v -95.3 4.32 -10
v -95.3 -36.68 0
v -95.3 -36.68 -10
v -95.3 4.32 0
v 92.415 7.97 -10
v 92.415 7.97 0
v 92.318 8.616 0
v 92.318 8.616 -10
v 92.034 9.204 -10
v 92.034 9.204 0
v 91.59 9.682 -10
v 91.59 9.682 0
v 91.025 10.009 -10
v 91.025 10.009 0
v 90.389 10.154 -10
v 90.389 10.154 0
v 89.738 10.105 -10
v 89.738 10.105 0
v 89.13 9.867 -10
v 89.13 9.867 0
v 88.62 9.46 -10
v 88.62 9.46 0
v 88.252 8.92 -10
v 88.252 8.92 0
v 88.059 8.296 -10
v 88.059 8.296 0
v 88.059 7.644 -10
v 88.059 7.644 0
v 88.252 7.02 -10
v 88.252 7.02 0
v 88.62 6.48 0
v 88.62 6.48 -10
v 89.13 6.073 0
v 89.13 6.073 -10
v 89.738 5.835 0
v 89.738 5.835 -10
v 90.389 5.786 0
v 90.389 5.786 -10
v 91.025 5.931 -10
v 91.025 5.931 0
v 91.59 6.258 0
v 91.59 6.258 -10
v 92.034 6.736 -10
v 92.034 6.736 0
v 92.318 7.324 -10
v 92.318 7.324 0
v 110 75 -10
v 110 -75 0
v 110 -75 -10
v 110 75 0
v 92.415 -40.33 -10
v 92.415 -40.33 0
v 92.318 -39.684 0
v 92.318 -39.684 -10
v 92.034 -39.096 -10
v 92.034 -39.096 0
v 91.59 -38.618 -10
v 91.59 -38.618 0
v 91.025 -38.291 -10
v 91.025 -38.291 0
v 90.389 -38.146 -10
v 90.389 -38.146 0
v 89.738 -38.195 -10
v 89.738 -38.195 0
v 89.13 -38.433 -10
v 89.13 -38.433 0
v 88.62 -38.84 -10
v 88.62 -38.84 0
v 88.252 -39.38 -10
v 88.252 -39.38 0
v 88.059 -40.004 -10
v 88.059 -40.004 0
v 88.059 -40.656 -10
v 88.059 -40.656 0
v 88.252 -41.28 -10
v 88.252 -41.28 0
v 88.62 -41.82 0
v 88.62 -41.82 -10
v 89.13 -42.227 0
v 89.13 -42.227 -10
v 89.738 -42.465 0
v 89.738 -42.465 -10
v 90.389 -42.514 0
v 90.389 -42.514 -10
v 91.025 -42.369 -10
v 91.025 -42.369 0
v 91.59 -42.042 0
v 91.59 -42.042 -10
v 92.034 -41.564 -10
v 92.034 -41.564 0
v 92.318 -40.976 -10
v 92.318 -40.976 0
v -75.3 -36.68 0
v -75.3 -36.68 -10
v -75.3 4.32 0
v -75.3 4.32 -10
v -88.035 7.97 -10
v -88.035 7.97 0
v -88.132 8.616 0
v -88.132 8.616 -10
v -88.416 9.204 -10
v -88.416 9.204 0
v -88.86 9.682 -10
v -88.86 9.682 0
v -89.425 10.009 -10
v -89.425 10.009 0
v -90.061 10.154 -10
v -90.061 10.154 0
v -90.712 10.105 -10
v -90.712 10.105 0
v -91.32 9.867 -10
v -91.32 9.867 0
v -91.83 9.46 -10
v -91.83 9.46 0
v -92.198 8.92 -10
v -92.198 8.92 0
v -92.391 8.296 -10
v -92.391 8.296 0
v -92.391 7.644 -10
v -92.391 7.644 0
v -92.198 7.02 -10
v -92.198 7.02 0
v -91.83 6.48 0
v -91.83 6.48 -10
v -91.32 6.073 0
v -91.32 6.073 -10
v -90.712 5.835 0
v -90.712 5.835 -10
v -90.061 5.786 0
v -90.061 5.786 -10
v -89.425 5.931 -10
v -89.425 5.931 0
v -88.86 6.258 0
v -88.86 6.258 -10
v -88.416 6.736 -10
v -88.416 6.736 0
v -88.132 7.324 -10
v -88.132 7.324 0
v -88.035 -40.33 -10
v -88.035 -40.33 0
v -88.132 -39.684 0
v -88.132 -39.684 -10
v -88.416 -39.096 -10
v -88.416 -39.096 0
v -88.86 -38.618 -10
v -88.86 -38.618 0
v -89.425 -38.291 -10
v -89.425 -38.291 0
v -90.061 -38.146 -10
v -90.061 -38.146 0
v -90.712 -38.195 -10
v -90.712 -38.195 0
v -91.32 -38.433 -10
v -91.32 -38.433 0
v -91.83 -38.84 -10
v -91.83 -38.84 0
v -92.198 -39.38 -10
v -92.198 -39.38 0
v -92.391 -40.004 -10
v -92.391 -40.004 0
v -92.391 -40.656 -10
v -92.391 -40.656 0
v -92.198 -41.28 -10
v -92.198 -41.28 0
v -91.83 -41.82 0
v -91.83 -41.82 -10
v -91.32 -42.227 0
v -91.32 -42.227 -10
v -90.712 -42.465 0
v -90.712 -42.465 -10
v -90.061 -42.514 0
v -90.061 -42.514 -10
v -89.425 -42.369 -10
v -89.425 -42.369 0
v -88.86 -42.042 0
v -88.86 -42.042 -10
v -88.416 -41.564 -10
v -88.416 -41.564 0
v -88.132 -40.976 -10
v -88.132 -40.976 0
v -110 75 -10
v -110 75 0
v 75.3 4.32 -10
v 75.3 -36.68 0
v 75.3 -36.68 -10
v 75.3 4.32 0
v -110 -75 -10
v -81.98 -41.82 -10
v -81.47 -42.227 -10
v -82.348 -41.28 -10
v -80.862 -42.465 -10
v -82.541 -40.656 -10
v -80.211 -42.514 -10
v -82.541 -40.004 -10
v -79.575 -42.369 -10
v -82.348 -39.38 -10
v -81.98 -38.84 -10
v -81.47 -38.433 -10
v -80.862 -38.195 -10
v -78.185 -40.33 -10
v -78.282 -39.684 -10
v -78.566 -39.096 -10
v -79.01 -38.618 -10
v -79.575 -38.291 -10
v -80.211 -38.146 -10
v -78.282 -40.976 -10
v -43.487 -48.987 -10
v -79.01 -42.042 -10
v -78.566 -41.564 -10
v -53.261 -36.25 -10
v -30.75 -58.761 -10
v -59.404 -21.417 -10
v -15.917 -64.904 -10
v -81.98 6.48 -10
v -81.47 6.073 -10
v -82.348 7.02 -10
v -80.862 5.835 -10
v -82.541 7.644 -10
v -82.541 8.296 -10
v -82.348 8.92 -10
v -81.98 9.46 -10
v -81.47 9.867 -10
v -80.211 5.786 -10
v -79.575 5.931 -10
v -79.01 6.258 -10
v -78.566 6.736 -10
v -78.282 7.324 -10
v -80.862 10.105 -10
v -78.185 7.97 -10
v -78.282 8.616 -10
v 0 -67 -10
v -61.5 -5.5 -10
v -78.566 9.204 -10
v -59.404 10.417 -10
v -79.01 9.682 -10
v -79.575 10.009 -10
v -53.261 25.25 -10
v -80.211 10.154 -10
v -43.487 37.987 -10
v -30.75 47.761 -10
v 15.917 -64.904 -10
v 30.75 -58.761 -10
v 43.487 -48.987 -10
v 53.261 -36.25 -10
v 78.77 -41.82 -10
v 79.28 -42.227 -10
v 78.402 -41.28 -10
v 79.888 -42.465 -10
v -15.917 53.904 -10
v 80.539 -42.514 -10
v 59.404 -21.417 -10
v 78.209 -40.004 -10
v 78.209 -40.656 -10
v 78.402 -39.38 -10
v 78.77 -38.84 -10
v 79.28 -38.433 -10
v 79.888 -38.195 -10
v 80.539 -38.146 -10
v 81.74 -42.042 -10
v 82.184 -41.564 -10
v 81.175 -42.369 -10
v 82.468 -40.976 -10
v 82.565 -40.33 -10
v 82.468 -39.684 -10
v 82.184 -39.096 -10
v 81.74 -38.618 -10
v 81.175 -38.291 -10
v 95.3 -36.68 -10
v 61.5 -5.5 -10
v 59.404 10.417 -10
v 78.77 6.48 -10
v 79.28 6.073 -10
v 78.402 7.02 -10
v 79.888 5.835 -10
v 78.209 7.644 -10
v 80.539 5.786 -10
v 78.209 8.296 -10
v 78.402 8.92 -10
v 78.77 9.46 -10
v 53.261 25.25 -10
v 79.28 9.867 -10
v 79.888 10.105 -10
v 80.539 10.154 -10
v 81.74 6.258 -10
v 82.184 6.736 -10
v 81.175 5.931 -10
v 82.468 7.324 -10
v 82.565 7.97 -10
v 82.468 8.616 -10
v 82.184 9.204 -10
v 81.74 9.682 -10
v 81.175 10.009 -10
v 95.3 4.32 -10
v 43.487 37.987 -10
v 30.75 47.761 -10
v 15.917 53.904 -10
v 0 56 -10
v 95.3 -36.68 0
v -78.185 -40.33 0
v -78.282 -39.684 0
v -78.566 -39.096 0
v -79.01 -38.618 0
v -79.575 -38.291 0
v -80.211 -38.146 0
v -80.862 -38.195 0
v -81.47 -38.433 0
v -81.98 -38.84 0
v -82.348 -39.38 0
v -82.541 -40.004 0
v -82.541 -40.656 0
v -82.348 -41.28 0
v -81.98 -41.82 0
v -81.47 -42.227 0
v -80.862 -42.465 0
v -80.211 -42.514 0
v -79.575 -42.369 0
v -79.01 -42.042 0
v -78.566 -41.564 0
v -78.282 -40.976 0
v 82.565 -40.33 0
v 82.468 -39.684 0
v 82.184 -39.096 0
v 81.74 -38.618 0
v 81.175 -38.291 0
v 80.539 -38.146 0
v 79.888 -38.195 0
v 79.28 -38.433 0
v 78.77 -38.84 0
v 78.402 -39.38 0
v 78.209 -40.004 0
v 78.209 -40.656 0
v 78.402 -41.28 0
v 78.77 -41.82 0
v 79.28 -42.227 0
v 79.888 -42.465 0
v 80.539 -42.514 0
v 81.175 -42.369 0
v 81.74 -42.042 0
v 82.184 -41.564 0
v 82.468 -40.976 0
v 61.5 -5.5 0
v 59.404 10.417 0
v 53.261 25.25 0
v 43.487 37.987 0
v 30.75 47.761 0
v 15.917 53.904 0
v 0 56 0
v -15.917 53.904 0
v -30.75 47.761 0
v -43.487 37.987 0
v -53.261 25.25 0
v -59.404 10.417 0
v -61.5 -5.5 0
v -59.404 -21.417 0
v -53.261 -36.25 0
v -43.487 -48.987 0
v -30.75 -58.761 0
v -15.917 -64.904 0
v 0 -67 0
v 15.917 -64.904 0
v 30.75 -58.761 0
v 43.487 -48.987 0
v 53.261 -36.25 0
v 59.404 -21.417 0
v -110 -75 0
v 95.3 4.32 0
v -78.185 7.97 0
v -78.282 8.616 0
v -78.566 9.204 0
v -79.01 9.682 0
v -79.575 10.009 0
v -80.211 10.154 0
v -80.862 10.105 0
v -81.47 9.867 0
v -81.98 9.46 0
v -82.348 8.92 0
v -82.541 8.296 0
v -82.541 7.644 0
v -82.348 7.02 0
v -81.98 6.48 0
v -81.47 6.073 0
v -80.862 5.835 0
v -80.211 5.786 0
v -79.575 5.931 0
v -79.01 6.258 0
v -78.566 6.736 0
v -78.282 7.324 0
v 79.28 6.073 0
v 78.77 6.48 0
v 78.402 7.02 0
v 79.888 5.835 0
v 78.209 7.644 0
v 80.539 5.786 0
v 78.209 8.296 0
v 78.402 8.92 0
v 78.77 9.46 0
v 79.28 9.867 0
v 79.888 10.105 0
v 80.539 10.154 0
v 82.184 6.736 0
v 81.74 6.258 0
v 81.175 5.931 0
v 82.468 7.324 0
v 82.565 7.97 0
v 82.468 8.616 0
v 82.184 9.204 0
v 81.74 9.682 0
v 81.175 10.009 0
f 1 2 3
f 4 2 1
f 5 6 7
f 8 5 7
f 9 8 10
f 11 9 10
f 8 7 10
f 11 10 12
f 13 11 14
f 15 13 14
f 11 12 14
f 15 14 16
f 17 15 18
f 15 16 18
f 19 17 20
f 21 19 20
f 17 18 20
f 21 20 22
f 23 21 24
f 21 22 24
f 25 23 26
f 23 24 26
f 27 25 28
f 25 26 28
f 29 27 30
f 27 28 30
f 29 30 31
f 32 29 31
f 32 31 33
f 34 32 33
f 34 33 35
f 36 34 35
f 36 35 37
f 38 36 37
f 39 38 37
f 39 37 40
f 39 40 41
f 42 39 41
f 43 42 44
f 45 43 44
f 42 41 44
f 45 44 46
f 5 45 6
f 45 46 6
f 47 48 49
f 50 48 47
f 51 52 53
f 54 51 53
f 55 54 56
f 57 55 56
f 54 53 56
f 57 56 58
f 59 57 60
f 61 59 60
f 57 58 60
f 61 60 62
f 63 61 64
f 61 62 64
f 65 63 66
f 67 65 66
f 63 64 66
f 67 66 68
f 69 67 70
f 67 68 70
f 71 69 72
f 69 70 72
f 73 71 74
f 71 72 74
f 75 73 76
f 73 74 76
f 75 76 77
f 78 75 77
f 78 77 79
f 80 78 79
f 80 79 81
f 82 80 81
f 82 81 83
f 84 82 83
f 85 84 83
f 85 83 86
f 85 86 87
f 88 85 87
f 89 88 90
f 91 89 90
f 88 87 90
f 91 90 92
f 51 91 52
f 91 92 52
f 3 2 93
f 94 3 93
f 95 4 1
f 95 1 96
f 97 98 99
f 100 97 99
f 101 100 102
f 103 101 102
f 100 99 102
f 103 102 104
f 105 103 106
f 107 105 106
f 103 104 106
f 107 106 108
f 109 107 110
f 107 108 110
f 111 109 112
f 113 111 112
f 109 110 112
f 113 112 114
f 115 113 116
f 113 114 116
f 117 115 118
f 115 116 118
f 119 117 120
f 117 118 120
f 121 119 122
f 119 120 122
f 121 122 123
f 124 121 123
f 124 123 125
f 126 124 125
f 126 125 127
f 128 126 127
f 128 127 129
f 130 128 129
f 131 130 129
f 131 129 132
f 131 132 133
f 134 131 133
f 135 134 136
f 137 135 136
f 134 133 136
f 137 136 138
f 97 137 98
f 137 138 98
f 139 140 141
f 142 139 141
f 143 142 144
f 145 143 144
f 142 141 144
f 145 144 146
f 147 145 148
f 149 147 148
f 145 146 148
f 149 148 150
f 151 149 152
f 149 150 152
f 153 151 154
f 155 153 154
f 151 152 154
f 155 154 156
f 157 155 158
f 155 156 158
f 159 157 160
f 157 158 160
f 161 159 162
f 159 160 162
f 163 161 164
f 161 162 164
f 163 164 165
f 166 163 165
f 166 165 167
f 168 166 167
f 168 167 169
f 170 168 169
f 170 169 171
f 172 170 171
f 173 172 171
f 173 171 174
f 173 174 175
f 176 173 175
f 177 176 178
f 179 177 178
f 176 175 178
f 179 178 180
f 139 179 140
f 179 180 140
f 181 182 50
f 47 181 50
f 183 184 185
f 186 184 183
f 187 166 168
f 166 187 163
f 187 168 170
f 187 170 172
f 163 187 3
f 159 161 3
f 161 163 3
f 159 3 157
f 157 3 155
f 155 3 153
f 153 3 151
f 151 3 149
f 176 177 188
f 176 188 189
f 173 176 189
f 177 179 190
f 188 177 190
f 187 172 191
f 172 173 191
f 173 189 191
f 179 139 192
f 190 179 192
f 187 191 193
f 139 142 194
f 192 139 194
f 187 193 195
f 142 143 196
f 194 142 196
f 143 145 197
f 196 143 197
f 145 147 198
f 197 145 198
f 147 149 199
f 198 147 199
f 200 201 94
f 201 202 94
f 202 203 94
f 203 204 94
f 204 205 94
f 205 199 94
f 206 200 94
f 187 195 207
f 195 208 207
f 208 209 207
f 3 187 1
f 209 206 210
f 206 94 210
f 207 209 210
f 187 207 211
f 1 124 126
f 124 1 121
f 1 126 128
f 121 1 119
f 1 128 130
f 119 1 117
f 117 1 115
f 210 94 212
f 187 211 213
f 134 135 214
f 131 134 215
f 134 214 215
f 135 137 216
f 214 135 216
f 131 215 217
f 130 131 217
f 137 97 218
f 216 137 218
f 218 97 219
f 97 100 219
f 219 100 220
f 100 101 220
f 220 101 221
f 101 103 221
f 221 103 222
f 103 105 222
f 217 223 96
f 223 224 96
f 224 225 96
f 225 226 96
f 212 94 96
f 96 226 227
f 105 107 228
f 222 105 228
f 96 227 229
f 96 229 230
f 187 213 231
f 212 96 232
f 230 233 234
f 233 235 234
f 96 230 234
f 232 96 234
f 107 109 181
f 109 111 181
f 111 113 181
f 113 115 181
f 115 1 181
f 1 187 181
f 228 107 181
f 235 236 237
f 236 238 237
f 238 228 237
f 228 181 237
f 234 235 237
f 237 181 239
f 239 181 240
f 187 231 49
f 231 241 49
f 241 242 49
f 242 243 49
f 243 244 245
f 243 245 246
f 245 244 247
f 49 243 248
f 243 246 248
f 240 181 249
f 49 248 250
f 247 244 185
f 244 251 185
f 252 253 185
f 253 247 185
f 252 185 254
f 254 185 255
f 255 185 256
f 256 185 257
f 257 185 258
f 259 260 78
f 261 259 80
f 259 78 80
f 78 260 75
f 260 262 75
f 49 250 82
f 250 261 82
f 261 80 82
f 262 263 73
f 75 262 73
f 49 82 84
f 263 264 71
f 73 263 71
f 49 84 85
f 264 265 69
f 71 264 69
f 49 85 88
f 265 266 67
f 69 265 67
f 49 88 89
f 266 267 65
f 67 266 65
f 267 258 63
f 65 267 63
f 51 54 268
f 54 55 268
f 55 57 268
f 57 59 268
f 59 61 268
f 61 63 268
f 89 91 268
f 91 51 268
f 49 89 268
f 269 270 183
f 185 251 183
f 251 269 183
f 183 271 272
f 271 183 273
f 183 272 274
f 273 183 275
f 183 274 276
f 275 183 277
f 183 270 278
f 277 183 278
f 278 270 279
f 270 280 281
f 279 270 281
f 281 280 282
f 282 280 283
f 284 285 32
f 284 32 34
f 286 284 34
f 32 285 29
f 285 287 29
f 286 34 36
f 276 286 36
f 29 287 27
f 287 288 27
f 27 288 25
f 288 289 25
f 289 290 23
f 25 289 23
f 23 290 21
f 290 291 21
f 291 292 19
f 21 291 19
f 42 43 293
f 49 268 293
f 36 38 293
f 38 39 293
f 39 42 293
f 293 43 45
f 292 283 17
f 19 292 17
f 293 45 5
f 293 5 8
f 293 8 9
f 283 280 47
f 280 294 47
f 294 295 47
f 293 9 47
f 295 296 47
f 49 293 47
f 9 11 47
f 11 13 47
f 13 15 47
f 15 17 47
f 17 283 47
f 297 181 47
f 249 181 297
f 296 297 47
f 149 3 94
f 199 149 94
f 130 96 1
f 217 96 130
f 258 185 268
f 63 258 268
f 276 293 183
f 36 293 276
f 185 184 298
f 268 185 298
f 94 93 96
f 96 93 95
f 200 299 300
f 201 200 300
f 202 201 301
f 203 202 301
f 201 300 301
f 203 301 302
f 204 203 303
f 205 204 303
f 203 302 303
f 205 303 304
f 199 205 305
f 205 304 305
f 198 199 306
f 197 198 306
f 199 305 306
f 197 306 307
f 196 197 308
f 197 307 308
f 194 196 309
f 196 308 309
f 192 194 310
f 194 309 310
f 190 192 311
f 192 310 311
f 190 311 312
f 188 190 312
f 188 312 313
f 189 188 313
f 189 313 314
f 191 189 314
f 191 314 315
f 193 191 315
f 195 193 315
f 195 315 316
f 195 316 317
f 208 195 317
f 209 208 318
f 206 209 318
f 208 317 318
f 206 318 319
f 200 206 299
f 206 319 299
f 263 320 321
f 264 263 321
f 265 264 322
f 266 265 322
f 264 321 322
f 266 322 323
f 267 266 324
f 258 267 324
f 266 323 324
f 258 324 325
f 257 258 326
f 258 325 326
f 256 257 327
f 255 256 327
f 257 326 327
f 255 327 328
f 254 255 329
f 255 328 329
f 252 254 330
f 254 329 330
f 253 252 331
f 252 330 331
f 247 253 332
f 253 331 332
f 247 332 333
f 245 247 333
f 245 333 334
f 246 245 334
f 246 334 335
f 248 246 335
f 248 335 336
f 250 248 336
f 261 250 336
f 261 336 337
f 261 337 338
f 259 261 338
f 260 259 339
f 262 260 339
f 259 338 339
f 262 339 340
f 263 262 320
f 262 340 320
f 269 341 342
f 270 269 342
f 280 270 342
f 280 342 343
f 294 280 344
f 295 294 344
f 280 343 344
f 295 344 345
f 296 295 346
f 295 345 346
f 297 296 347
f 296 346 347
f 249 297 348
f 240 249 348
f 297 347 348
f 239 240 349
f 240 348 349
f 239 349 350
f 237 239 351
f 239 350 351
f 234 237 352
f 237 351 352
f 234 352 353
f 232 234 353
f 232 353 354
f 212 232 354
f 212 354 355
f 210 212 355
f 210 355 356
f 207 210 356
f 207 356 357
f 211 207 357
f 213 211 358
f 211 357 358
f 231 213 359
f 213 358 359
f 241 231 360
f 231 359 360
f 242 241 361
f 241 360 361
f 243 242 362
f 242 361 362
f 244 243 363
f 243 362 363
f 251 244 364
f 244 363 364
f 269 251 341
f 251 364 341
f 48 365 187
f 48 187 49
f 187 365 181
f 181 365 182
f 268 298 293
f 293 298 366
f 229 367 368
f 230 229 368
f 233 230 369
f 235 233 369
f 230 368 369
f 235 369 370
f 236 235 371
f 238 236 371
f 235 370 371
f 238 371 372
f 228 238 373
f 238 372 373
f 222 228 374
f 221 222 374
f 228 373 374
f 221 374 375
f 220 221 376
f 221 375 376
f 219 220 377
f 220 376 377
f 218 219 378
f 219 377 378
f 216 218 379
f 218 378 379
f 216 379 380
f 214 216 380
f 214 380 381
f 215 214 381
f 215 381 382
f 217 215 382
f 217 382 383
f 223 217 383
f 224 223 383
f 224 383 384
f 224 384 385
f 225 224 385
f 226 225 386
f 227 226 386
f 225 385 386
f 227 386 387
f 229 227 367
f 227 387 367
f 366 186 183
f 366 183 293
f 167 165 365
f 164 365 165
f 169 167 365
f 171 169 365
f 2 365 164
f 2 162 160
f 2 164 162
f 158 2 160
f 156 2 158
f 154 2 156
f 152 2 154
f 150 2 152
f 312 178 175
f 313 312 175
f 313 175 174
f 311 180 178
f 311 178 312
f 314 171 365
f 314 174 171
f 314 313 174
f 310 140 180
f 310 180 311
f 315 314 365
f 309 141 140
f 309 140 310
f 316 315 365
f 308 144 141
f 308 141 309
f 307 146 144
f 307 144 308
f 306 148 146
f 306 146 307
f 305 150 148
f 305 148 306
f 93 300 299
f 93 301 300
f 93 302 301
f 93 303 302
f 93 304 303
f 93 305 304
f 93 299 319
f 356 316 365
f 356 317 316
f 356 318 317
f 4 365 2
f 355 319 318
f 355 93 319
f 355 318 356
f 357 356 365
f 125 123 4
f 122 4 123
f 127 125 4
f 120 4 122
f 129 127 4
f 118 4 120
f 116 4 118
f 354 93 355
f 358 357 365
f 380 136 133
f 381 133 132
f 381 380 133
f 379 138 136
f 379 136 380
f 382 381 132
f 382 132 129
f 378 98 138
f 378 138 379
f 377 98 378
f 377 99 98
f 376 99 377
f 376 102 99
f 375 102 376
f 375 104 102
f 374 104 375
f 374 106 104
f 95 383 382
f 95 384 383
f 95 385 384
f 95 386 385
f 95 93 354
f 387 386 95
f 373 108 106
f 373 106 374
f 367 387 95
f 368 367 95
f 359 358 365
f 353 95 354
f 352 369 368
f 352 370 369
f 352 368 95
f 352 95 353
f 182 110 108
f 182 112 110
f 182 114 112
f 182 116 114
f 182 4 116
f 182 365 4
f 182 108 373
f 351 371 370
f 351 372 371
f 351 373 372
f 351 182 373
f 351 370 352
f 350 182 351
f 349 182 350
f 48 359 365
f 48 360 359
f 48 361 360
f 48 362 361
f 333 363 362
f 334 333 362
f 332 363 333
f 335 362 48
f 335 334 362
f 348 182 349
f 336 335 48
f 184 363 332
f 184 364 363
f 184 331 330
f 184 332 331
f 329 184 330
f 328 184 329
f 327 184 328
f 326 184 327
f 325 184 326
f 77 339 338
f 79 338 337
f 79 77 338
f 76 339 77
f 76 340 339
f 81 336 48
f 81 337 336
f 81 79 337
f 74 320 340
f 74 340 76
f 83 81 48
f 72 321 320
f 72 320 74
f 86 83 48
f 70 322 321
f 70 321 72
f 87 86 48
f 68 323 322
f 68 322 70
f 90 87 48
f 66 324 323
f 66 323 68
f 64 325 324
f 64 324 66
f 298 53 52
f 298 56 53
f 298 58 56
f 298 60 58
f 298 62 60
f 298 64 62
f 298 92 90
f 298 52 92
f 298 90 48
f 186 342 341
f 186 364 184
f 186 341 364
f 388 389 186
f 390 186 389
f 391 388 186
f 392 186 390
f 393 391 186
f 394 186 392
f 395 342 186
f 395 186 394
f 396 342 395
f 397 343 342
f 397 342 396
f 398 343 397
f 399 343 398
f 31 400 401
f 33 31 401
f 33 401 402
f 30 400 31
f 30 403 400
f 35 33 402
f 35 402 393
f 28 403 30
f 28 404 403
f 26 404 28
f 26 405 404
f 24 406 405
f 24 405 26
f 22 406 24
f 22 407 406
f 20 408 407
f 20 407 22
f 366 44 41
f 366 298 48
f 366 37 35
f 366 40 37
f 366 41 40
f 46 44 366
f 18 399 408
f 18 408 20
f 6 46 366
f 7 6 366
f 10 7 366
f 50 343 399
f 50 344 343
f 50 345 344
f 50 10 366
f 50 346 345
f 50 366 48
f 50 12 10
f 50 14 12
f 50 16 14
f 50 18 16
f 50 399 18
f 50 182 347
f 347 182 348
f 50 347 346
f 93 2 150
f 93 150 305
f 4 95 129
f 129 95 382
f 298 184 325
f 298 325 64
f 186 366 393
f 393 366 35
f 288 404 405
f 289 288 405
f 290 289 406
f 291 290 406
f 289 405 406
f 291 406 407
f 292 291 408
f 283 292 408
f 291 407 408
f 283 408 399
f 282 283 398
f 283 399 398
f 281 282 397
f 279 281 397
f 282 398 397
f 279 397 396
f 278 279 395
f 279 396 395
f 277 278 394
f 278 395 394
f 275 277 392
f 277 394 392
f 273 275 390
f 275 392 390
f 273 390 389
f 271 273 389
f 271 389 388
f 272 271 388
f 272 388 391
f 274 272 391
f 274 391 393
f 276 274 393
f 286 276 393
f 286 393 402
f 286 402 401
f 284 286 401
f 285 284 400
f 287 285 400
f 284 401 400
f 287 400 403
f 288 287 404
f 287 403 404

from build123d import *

# Parameters (mm, degrees)
F0_W     = 220
F0_H     = 150
F0_R     = 61.5
F2_DEPTH = 10
F1_W     = 20
F1_H     = 41
F1_R     = 2.19
F3_DEPTH = 10


with BuildPart() as f2:
    # F0 (on Top) → F2 (new body)
    with BuildSketch(Plane.XY):
        Rectangle(F0_W, F0_H)
        with Locations((0, -5.5)):
            Circle(F0_R, mode=Mode.SUBTRACT)
    extrude(amount=-F2_DEPTH)

    # F1 (on Top) → F3 (cut, through all)
    with BuildSketch(Plane.XY):
        with Locations((-85.3, -16.18)):
            Rectangle(F1_W, F1_H)
        with Locations((-80.375, 7.97)):
            Circle(F1_R)
        with Locations((-90.225, 7.97)):
            Circle(F1_R)
        with Locations((-80.375, -40.33)):
            Circle(F1_R)
        with Locations((-90.225, -40.33)):
            Circle(F1_R)
        with Locations((85.3, -16.18)):
            Rectangle(F1_W, F1_H)
        with Locations((80.375, 7.97)):
            Circle(F1_R)
        with Locations((90.225, 7.97)):
            Circle(F1_R)
        with Locations((80.375, -40.33)):
            Circle(F1_R)
        with Locations((90.225, -40.33)):
            Circle(F1_R)
    extrude(amount=-F3_DEPTH, mode=Mode.SUBTRACT)


solid = f2.part
